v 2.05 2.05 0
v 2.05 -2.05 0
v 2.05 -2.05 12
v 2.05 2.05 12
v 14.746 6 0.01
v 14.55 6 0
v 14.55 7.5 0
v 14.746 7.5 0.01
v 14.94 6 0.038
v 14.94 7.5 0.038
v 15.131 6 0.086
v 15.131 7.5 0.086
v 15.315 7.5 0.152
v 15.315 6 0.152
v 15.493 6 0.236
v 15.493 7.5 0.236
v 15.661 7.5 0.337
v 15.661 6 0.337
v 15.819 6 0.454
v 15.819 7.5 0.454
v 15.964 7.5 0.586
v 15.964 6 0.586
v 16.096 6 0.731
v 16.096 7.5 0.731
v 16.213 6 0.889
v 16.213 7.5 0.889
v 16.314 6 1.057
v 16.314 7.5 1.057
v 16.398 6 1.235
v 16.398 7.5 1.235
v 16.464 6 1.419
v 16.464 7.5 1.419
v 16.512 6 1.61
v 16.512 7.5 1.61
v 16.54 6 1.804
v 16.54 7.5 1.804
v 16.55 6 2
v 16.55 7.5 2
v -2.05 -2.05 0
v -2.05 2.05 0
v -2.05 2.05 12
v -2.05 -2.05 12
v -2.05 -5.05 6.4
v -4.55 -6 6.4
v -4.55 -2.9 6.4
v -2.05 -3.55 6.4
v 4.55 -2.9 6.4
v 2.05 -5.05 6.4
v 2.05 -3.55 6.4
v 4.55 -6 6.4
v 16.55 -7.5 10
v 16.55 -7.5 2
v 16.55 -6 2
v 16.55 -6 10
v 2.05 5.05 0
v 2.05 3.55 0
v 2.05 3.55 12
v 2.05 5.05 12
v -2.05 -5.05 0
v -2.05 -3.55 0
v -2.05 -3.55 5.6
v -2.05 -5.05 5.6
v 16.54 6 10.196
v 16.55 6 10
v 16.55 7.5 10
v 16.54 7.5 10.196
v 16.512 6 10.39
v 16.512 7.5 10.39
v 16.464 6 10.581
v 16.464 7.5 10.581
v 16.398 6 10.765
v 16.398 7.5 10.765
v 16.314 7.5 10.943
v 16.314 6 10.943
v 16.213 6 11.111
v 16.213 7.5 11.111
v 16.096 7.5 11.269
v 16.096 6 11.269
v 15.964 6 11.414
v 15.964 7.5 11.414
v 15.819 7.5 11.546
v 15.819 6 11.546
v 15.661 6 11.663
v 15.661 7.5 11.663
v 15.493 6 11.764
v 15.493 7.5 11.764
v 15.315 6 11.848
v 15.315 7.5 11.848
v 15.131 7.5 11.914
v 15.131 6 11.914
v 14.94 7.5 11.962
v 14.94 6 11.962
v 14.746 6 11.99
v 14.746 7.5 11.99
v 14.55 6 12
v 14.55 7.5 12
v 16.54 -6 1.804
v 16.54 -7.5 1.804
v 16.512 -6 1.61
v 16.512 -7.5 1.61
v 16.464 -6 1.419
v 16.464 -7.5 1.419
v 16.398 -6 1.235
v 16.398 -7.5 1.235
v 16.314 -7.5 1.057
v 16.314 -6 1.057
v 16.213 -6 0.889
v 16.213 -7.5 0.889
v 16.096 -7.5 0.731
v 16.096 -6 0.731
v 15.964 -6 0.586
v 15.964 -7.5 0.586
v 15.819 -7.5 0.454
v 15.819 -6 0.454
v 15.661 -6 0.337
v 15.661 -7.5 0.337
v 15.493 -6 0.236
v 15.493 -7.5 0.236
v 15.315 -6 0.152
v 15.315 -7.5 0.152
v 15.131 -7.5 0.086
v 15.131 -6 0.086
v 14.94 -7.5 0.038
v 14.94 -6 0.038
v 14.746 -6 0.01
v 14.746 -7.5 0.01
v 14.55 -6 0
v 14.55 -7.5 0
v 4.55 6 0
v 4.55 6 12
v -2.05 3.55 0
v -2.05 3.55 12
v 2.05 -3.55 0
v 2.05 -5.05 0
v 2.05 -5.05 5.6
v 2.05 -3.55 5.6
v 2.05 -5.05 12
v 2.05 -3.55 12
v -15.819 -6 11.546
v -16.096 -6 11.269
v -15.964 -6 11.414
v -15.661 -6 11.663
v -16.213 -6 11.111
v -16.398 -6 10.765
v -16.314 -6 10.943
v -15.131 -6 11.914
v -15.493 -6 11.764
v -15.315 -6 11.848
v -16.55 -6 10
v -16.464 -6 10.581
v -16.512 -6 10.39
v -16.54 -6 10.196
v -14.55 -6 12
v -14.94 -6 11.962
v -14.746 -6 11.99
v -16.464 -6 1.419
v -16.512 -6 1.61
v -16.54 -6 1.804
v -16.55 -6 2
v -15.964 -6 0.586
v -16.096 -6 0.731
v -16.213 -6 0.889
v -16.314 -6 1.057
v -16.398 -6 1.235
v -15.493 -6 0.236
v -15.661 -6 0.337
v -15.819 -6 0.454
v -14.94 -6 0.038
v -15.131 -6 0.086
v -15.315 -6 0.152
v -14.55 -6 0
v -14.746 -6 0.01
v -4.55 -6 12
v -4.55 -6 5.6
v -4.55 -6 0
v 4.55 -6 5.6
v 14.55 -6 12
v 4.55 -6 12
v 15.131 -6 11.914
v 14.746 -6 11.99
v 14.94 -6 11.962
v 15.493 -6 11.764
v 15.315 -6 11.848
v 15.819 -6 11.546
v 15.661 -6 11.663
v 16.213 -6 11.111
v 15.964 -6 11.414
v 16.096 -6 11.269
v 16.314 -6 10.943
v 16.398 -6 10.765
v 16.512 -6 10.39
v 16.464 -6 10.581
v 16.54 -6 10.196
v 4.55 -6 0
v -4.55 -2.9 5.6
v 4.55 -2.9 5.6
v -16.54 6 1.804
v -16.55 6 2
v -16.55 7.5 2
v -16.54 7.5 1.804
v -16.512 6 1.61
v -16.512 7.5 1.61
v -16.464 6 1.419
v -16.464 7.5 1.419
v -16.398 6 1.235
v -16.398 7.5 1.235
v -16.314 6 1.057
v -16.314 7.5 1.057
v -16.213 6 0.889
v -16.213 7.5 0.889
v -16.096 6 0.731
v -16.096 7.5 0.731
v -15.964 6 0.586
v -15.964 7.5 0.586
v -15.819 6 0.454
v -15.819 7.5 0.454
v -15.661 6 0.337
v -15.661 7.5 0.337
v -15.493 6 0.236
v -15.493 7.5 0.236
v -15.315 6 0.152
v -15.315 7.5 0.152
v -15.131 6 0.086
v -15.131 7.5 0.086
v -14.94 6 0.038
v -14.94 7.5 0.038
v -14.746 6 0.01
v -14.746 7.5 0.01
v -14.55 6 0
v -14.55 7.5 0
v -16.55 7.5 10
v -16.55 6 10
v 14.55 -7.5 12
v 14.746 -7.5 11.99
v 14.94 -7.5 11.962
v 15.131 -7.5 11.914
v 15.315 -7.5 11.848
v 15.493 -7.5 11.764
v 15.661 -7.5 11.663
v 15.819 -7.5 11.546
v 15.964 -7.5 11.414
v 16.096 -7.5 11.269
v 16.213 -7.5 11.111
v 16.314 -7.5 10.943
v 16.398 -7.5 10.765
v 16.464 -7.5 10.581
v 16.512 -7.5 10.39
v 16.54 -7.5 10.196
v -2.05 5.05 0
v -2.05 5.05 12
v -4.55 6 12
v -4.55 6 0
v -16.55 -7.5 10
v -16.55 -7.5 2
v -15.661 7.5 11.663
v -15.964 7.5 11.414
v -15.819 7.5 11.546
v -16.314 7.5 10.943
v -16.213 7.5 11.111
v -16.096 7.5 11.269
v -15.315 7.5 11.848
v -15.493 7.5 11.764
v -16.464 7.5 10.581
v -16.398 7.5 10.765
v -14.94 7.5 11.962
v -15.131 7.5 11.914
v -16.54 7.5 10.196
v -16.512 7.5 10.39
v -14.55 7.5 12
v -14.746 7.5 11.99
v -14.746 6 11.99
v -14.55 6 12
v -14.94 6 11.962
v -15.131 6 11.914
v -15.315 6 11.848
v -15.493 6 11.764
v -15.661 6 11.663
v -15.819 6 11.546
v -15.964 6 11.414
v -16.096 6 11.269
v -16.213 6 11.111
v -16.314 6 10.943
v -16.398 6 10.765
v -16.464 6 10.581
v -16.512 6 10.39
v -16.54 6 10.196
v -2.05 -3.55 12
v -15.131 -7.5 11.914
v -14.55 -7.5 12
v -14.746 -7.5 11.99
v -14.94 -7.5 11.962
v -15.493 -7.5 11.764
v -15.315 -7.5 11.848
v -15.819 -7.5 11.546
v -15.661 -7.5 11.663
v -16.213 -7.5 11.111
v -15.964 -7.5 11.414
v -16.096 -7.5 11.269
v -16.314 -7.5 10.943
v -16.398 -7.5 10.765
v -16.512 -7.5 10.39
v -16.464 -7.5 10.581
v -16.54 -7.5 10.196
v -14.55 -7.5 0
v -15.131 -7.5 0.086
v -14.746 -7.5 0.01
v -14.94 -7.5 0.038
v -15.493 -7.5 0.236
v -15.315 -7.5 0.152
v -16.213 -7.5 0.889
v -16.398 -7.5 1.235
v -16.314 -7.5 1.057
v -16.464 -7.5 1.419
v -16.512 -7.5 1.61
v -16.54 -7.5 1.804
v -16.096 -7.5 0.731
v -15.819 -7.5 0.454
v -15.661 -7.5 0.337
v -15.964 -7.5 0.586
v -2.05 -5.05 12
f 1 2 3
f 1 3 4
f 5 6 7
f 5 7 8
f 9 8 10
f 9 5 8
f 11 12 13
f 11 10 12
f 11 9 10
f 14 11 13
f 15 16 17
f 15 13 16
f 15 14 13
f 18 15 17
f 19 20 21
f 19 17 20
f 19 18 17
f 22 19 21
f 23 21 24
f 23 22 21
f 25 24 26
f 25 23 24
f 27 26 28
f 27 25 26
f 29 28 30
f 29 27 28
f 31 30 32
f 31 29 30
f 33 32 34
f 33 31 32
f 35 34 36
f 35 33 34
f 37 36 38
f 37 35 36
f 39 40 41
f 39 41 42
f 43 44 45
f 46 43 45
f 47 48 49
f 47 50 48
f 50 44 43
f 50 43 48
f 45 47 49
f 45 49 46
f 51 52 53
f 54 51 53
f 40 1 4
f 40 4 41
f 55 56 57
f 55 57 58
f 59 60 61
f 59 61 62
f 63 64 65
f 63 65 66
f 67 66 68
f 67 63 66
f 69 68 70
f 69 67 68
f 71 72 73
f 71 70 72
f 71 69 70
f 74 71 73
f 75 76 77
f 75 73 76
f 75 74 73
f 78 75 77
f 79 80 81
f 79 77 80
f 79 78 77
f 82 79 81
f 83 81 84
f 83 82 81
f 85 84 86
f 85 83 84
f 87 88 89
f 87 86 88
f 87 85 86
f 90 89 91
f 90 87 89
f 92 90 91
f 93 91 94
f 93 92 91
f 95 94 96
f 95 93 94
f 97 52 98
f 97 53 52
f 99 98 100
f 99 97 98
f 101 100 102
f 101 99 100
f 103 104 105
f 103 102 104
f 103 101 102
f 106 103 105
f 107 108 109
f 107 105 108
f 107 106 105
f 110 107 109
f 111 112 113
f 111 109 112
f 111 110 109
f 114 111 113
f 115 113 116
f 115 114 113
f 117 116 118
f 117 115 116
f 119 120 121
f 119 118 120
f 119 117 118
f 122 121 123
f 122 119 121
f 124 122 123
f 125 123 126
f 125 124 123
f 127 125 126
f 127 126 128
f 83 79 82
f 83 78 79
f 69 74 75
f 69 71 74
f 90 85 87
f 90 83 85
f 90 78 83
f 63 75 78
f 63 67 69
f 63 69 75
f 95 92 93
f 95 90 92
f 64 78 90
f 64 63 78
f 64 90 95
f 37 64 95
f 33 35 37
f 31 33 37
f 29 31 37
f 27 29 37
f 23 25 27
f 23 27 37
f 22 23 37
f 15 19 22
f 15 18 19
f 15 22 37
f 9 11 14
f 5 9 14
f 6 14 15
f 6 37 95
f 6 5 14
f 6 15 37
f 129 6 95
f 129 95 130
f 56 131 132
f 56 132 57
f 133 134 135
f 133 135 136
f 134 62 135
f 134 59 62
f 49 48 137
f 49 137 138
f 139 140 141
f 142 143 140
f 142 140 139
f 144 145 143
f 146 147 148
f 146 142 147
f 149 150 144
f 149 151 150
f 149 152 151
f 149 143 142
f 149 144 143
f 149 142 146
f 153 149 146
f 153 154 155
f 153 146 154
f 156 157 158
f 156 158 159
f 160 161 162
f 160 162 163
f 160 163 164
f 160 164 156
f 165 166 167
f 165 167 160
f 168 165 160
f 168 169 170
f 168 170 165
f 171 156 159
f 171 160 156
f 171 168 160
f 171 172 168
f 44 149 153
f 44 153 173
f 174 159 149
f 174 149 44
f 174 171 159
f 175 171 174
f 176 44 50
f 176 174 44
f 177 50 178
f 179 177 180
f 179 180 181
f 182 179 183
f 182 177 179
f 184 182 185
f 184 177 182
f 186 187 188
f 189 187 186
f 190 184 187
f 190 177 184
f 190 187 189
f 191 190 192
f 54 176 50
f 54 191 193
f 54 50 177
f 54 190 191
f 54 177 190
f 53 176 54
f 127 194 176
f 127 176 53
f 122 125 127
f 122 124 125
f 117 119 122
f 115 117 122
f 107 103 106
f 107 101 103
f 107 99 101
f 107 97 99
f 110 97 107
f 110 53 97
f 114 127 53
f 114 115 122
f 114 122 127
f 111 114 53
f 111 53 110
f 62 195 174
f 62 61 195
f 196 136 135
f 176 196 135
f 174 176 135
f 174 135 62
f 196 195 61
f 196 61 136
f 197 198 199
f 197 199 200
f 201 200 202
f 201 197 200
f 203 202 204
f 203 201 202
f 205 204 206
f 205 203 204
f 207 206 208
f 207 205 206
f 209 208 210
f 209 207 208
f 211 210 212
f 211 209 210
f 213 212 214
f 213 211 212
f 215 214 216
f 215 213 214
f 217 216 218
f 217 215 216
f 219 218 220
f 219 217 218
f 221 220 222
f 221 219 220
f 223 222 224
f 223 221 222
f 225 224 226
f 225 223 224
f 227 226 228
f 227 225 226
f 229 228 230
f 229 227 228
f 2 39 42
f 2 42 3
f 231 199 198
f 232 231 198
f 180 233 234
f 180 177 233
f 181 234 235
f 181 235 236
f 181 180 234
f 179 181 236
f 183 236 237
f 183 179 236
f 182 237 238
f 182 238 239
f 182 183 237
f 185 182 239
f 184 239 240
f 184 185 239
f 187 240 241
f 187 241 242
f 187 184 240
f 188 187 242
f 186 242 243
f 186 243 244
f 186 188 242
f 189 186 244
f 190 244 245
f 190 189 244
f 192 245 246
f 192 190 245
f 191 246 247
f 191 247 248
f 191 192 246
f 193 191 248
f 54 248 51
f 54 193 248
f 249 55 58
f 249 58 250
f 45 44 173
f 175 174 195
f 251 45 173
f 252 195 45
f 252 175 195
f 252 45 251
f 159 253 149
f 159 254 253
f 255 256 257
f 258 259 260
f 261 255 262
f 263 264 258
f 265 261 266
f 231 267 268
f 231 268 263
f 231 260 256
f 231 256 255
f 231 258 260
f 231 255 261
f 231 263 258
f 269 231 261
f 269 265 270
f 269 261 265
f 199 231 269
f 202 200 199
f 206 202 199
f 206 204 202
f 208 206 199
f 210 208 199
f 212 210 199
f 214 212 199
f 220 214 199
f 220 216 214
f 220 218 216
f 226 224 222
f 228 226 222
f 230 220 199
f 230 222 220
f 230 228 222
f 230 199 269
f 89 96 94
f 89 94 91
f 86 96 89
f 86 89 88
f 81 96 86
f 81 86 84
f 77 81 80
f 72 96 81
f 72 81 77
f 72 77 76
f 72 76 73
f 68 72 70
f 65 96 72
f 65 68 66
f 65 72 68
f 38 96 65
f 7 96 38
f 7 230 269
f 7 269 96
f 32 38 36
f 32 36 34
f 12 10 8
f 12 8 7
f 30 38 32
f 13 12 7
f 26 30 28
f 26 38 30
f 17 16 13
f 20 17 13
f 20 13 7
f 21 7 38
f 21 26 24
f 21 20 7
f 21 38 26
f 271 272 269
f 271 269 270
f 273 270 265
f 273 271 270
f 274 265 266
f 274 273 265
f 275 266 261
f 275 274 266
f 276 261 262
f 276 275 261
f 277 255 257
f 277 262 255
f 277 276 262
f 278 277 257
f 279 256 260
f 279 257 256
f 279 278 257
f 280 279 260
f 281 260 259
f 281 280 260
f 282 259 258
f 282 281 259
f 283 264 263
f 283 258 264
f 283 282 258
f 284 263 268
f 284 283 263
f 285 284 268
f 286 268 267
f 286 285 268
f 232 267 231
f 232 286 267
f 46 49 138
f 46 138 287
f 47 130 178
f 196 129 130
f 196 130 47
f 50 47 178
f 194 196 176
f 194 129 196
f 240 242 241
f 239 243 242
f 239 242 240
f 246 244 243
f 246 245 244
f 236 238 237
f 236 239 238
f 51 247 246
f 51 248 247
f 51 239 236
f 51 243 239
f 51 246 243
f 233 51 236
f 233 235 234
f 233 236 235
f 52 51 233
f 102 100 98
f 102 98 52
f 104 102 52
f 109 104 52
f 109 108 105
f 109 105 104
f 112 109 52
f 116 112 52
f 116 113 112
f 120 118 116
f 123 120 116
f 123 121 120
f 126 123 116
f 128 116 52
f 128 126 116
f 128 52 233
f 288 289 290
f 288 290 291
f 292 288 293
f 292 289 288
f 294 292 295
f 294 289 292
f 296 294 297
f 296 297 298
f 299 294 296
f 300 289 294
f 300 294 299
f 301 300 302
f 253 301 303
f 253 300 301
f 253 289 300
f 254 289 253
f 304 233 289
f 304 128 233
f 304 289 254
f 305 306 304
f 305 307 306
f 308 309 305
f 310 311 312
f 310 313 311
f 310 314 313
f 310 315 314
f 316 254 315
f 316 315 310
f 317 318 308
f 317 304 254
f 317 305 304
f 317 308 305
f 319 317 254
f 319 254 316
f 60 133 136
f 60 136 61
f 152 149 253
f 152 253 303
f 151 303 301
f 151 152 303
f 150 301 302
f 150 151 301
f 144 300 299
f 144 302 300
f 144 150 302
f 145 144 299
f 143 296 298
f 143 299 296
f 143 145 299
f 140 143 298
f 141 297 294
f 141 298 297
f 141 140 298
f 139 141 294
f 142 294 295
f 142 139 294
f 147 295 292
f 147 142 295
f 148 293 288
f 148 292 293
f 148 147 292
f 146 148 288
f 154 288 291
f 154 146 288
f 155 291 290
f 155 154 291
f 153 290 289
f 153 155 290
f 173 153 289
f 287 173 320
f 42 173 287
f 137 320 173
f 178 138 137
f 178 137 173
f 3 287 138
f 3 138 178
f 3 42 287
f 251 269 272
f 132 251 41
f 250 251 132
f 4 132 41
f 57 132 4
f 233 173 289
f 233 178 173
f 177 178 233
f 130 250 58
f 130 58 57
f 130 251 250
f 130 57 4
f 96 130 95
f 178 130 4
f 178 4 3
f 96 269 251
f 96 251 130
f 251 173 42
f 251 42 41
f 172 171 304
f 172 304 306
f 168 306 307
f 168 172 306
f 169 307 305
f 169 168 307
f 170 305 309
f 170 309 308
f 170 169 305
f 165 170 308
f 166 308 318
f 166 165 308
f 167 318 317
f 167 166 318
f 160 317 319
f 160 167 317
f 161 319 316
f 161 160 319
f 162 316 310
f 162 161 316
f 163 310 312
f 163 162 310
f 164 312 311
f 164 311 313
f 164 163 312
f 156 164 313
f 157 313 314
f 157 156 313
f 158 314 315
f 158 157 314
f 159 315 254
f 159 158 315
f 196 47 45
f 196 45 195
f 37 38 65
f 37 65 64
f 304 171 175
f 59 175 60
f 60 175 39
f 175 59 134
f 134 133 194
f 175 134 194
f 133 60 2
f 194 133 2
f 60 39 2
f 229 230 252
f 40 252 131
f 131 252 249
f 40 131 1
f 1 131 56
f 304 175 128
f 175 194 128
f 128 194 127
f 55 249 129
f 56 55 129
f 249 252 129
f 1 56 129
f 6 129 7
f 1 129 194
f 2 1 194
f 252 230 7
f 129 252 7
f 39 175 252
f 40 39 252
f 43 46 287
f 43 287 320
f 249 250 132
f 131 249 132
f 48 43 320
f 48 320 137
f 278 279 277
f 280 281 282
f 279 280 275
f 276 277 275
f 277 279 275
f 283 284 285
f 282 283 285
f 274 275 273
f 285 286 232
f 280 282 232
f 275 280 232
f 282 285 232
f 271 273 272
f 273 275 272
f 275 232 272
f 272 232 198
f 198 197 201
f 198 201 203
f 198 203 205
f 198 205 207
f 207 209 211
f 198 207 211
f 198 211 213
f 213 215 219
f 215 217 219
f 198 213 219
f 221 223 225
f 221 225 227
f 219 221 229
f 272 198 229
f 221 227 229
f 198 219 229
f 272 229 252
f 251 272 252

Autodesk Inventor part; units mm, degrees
sketch "Sketch1" plane through (0, 0, 0) normal (0, 0, 1) x (1, 0, 0)
  line L0 (-4.55, 7.5) -> (4.55, 7.5)
  line L1 (4.55, 7.5) -> (4.55, -7.5)
  line L2 (4.55, -7.5) -> (-4.55, -7.5)
  line L3 (-4.55, -7.5) -> (-4.55, 7.5)
  line L4 (-4.55, 7.5) -> (4.55, -7.5) construction
  line L5 (4.55, 7.5) -> (-4.55, -7.5) construction
  line L6 (-2.05, -2.05) -> (2.05, -2.05)
  line L7 (2.05, -2.05) -> (2.05, 2.05)
  line L8 (2.05, 2.05) -> (-2.05, 2.05)
  line L9 (-2.05, 2.05) -> (-2.05, -2.05)
  line L10 (-2.05, -2.05) -> (2.05, 2.05) construction
  line L11 (2.05, -2.05) -> (-2.05, 2.05) construction
  line L12 (-4.55, 7.5) -> (-16.55, 7.5)
  line L13 (-16.55, 7.5) -> (-16.55, 6)
  line L14 (-16.55, 6) -> (-4.55, 6)
  line L15 (-4.55, 6) -> (-4.55, 7.5)
  line L16 (-4.55, -7.5) -> (-16.55, -7.5)
  line L17 (-16.55, -7.5) -> (-16.55, -6)
  line L18 (-16.55, -6) -> (-4.55, -6)
  line L19 (-4.55, -6) -> (-4.55, -7.5)
  line L20 (4.55, 7.5) -> (16.55, 7.5)
  line L21 (16.55, 7.5) -> (16.55, 6)
  line L22 (16.55, 6) -> (4.55, 6)
  line L23 (4.55, 6) -> (4.55, 7.5)
  line L24 (4.55, -7.5) -> (16.55, -7.5)
  line L25 (16.55, -7.5) -> (16.55, -6)
  line L26 (16.55, -6) -> (4.55, -6)
  line L27 (4.55, -6) -> (4.55, -7.5)
  point P0 (0, 0)
  point P1 (-4.55, 6)
  point P2 (-4.55, -6)
  point P3 (4.55, 6)
  dimension "d0" = 15
  dimension "d1" = 9.1
  dimension "d2" = 4.1
  dimension "d3" = 4.1
  dimension "d4" = 12
  dimension "d5" = 1.5
  dimension "d8" = 1.5
  dimension "d9" = 12
  dimension "d10" = 12
  dimension "d11" = 1.5
  dimension "d12" = 12
extrude "Extrusion1" add sketch "Sketch1" along normal blind 12
sketch "Sketch3" plane through (4.55, -6, 0) normal (1, 0, 0) x (0, 0, -1)
  line L0 (-6.4, 3.1) -> (-5.6, 3.1)
  line L1 (-5.6, 3.1) -> (-5.6, 0)
  line L2 (-5.6, 0) -> (-6.4, 0)
  line L3 (-6.4, 0) -> (-6.4, 3.1)
  line L4 (0, 12) -> (-12, 12) projected
  line L5 (0, 0) -> (0, 12) projected
  line L6 (0, 0) -> (-12, 0) projected
  point P0 (0, 6)
  dimension "d24" = 3.1
  dimension "d25" = 0.8
  dimension "d30" = 0
  dimension "d39" = 12
  dimension "d40" = 5.6
extrude "Extrusion3" cut sketch "Sketch3" against normal through all
sketch "Sketch5" plane through (0, 0, 0) normal (0, 0, -1) x (-1, 0, 0)
  line L0 (-2.05, 5.05) -> (2.05, 5.05)
  line L1 (2.05, 5.05) -> (2.05, 3.55)
  line L2 (2.05, 3.55) -> (-2.05, 3.55)
  line L3 (-2.05, 3.55) -> (-2.05, 5.05)
  line L4 (-2.05, -3.55) -> (2.05, -3.55)
  line L5 (2.05, -3.55) -> (2.05, -5.05)
  line L6 (2.05, -5.05) -> (-2.05, -5.05)
  line L7 (-2.05, -5.05) -> (-2.05, -3.55)
  line L8 (2.05, 2.05) -> (-2.05, 2.05) projected
  line L9 (2.05, -2.05) -> (2.05, 2.05) projected
  line L10 (-2.05, -2.05) -> (2.05, -2.05) projected
  point P0 (0, 0)
  dimension "d31" = 4.1
  dimension "d32" = 4.1
  dimension "d33" = 1.5
  dimension "d34" = 1.5
  dimension "d35" = 1.5
  dimension "d36" = 1.5
extrude "Extrusion4" cut sketch "Sketch5" against normal through all
fillet "Fillet2" radius 2 8 edges at (-16.55, 6.75, 0) (-16.55, 6.75, 12) (-16.55, -6.75, 0) (-16.55, -6.75, 12) (16.55, 6.75, 12) (16.55, -6.75, 12) (16.55, 6.75, 0) (16.55, -6.75, 0)
equation "\"d40\" = -0.5 * d25 + 0.5 * d39"
equation "\"d31\" = d32"
properties part number "wing_clamp_interface"
